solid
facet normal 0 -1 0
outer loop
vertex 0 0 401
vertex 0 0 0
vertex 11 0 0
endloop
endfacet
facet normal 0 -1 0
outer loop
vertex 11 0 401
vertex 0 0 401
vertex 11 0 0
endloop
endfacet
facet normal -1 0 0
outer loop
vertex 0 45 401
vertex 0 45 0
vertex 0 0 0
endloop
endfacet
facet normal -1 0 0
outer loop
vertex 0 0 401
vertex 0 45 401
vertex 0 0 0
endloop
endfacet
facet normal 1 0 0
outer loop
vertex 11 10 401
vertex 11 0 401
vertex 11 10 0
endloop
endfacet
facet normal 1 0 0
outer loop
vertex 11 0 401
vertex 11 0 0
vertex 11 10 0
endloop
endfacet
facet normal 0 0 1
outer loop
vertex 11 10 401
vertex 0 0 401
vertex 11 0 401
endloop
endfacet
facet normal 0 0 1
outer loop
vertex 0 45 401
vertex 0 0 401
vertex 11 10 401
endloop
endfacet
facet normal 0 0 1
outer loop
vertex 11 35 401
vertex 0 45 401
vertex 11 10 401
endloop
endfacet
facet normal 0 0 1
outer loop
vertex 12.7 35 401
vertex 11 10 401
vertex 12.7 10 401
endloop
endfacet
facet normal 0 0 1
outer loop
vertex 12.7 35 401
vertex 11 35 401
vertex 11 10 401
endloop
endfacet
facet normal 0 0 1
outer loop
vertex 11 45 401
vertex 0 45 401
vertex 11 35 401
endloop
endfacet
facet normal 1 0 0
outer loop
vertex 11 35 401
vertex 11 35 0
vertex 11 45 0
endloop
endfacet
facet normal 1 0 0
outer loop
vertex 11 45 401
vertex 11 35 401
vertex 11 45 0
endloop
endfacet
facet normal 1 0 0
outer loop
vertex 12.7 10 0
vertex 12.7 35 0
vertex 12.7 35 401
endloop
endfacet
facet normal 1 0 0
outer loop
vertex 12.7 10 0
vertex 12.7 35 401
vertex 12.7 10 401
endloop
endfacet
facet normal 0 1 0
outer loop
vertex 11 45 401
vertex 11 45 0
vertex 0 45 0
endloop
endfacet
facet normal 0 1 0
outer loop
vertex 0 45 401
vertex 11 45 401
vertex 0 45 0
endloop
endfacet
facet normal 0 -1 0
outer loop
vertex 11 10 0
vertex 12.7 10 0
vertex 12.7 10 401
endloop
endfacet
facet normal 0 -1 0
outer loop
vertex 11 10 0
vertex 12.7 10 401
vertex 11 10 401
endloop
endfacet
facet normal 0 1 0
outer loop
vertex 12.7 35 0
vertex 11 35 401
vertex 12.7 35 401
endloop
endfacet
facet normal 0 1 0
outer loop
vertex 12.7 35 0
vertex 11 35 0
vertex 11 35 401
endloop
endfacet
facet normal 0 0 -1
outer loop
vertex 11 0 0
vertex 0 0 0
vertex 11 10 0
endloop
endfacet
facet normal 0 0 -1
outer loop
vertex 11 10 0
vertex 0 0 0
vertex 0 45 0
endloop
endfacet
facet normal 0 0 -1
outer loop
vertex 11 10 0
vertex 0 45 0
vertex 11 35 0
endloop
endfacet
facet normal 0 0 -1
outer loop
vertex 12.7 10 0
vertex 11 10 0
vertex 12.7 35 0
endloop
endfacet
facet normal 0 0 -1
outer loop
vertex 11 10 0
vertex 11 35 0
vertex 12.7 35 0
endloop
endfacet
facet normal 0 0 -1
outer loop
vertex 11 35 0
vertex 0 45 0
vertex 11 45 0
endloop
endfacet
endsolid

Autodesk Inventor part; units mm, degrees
ref_plane "YZ Plane" through (0, 0, 0) normal (1, 0, 0) x (0, 1, 0)
ref_plane "XZ Plane" through (0, 0, 0) normal (0, 1, 0) x (-1, 0, 0)
ref_plane "XY Plane" through (0, 0, 0) normal (0, 0, 1) x (1, 0, 0)
sketch "Sketch1" plane through (0, 0, 0) normal (0, 0, 1) x (1, 0, 0)
  line L0 (0, 0) -> (11, 0)
  line L1 (11, 0) -> (11, 45)
  line L2 (11, 45) -> (0, 45)
  line L3 (0, 45) -> (0, 0)
  line L4 (0, 22.5) -> (11, 22.5) construction
  line L5 (11, 35) -> (12.7, 35)
  line L6 (12.7, 35) -> (12.7, 10)
  line L7 (12.7, 10) -> (11, 10)
  line L8 (11, 10) -> (11, 35)
  dimension "d0" = 11
  dimension "d1" = 45
  dimension "d2" = 1.7
  dimension "d3" = 25
extrude "Extrusion1" add sketch "Sketch1" along normal blind 401
properties part number "prowadnica 400mm pelny wysuw"
